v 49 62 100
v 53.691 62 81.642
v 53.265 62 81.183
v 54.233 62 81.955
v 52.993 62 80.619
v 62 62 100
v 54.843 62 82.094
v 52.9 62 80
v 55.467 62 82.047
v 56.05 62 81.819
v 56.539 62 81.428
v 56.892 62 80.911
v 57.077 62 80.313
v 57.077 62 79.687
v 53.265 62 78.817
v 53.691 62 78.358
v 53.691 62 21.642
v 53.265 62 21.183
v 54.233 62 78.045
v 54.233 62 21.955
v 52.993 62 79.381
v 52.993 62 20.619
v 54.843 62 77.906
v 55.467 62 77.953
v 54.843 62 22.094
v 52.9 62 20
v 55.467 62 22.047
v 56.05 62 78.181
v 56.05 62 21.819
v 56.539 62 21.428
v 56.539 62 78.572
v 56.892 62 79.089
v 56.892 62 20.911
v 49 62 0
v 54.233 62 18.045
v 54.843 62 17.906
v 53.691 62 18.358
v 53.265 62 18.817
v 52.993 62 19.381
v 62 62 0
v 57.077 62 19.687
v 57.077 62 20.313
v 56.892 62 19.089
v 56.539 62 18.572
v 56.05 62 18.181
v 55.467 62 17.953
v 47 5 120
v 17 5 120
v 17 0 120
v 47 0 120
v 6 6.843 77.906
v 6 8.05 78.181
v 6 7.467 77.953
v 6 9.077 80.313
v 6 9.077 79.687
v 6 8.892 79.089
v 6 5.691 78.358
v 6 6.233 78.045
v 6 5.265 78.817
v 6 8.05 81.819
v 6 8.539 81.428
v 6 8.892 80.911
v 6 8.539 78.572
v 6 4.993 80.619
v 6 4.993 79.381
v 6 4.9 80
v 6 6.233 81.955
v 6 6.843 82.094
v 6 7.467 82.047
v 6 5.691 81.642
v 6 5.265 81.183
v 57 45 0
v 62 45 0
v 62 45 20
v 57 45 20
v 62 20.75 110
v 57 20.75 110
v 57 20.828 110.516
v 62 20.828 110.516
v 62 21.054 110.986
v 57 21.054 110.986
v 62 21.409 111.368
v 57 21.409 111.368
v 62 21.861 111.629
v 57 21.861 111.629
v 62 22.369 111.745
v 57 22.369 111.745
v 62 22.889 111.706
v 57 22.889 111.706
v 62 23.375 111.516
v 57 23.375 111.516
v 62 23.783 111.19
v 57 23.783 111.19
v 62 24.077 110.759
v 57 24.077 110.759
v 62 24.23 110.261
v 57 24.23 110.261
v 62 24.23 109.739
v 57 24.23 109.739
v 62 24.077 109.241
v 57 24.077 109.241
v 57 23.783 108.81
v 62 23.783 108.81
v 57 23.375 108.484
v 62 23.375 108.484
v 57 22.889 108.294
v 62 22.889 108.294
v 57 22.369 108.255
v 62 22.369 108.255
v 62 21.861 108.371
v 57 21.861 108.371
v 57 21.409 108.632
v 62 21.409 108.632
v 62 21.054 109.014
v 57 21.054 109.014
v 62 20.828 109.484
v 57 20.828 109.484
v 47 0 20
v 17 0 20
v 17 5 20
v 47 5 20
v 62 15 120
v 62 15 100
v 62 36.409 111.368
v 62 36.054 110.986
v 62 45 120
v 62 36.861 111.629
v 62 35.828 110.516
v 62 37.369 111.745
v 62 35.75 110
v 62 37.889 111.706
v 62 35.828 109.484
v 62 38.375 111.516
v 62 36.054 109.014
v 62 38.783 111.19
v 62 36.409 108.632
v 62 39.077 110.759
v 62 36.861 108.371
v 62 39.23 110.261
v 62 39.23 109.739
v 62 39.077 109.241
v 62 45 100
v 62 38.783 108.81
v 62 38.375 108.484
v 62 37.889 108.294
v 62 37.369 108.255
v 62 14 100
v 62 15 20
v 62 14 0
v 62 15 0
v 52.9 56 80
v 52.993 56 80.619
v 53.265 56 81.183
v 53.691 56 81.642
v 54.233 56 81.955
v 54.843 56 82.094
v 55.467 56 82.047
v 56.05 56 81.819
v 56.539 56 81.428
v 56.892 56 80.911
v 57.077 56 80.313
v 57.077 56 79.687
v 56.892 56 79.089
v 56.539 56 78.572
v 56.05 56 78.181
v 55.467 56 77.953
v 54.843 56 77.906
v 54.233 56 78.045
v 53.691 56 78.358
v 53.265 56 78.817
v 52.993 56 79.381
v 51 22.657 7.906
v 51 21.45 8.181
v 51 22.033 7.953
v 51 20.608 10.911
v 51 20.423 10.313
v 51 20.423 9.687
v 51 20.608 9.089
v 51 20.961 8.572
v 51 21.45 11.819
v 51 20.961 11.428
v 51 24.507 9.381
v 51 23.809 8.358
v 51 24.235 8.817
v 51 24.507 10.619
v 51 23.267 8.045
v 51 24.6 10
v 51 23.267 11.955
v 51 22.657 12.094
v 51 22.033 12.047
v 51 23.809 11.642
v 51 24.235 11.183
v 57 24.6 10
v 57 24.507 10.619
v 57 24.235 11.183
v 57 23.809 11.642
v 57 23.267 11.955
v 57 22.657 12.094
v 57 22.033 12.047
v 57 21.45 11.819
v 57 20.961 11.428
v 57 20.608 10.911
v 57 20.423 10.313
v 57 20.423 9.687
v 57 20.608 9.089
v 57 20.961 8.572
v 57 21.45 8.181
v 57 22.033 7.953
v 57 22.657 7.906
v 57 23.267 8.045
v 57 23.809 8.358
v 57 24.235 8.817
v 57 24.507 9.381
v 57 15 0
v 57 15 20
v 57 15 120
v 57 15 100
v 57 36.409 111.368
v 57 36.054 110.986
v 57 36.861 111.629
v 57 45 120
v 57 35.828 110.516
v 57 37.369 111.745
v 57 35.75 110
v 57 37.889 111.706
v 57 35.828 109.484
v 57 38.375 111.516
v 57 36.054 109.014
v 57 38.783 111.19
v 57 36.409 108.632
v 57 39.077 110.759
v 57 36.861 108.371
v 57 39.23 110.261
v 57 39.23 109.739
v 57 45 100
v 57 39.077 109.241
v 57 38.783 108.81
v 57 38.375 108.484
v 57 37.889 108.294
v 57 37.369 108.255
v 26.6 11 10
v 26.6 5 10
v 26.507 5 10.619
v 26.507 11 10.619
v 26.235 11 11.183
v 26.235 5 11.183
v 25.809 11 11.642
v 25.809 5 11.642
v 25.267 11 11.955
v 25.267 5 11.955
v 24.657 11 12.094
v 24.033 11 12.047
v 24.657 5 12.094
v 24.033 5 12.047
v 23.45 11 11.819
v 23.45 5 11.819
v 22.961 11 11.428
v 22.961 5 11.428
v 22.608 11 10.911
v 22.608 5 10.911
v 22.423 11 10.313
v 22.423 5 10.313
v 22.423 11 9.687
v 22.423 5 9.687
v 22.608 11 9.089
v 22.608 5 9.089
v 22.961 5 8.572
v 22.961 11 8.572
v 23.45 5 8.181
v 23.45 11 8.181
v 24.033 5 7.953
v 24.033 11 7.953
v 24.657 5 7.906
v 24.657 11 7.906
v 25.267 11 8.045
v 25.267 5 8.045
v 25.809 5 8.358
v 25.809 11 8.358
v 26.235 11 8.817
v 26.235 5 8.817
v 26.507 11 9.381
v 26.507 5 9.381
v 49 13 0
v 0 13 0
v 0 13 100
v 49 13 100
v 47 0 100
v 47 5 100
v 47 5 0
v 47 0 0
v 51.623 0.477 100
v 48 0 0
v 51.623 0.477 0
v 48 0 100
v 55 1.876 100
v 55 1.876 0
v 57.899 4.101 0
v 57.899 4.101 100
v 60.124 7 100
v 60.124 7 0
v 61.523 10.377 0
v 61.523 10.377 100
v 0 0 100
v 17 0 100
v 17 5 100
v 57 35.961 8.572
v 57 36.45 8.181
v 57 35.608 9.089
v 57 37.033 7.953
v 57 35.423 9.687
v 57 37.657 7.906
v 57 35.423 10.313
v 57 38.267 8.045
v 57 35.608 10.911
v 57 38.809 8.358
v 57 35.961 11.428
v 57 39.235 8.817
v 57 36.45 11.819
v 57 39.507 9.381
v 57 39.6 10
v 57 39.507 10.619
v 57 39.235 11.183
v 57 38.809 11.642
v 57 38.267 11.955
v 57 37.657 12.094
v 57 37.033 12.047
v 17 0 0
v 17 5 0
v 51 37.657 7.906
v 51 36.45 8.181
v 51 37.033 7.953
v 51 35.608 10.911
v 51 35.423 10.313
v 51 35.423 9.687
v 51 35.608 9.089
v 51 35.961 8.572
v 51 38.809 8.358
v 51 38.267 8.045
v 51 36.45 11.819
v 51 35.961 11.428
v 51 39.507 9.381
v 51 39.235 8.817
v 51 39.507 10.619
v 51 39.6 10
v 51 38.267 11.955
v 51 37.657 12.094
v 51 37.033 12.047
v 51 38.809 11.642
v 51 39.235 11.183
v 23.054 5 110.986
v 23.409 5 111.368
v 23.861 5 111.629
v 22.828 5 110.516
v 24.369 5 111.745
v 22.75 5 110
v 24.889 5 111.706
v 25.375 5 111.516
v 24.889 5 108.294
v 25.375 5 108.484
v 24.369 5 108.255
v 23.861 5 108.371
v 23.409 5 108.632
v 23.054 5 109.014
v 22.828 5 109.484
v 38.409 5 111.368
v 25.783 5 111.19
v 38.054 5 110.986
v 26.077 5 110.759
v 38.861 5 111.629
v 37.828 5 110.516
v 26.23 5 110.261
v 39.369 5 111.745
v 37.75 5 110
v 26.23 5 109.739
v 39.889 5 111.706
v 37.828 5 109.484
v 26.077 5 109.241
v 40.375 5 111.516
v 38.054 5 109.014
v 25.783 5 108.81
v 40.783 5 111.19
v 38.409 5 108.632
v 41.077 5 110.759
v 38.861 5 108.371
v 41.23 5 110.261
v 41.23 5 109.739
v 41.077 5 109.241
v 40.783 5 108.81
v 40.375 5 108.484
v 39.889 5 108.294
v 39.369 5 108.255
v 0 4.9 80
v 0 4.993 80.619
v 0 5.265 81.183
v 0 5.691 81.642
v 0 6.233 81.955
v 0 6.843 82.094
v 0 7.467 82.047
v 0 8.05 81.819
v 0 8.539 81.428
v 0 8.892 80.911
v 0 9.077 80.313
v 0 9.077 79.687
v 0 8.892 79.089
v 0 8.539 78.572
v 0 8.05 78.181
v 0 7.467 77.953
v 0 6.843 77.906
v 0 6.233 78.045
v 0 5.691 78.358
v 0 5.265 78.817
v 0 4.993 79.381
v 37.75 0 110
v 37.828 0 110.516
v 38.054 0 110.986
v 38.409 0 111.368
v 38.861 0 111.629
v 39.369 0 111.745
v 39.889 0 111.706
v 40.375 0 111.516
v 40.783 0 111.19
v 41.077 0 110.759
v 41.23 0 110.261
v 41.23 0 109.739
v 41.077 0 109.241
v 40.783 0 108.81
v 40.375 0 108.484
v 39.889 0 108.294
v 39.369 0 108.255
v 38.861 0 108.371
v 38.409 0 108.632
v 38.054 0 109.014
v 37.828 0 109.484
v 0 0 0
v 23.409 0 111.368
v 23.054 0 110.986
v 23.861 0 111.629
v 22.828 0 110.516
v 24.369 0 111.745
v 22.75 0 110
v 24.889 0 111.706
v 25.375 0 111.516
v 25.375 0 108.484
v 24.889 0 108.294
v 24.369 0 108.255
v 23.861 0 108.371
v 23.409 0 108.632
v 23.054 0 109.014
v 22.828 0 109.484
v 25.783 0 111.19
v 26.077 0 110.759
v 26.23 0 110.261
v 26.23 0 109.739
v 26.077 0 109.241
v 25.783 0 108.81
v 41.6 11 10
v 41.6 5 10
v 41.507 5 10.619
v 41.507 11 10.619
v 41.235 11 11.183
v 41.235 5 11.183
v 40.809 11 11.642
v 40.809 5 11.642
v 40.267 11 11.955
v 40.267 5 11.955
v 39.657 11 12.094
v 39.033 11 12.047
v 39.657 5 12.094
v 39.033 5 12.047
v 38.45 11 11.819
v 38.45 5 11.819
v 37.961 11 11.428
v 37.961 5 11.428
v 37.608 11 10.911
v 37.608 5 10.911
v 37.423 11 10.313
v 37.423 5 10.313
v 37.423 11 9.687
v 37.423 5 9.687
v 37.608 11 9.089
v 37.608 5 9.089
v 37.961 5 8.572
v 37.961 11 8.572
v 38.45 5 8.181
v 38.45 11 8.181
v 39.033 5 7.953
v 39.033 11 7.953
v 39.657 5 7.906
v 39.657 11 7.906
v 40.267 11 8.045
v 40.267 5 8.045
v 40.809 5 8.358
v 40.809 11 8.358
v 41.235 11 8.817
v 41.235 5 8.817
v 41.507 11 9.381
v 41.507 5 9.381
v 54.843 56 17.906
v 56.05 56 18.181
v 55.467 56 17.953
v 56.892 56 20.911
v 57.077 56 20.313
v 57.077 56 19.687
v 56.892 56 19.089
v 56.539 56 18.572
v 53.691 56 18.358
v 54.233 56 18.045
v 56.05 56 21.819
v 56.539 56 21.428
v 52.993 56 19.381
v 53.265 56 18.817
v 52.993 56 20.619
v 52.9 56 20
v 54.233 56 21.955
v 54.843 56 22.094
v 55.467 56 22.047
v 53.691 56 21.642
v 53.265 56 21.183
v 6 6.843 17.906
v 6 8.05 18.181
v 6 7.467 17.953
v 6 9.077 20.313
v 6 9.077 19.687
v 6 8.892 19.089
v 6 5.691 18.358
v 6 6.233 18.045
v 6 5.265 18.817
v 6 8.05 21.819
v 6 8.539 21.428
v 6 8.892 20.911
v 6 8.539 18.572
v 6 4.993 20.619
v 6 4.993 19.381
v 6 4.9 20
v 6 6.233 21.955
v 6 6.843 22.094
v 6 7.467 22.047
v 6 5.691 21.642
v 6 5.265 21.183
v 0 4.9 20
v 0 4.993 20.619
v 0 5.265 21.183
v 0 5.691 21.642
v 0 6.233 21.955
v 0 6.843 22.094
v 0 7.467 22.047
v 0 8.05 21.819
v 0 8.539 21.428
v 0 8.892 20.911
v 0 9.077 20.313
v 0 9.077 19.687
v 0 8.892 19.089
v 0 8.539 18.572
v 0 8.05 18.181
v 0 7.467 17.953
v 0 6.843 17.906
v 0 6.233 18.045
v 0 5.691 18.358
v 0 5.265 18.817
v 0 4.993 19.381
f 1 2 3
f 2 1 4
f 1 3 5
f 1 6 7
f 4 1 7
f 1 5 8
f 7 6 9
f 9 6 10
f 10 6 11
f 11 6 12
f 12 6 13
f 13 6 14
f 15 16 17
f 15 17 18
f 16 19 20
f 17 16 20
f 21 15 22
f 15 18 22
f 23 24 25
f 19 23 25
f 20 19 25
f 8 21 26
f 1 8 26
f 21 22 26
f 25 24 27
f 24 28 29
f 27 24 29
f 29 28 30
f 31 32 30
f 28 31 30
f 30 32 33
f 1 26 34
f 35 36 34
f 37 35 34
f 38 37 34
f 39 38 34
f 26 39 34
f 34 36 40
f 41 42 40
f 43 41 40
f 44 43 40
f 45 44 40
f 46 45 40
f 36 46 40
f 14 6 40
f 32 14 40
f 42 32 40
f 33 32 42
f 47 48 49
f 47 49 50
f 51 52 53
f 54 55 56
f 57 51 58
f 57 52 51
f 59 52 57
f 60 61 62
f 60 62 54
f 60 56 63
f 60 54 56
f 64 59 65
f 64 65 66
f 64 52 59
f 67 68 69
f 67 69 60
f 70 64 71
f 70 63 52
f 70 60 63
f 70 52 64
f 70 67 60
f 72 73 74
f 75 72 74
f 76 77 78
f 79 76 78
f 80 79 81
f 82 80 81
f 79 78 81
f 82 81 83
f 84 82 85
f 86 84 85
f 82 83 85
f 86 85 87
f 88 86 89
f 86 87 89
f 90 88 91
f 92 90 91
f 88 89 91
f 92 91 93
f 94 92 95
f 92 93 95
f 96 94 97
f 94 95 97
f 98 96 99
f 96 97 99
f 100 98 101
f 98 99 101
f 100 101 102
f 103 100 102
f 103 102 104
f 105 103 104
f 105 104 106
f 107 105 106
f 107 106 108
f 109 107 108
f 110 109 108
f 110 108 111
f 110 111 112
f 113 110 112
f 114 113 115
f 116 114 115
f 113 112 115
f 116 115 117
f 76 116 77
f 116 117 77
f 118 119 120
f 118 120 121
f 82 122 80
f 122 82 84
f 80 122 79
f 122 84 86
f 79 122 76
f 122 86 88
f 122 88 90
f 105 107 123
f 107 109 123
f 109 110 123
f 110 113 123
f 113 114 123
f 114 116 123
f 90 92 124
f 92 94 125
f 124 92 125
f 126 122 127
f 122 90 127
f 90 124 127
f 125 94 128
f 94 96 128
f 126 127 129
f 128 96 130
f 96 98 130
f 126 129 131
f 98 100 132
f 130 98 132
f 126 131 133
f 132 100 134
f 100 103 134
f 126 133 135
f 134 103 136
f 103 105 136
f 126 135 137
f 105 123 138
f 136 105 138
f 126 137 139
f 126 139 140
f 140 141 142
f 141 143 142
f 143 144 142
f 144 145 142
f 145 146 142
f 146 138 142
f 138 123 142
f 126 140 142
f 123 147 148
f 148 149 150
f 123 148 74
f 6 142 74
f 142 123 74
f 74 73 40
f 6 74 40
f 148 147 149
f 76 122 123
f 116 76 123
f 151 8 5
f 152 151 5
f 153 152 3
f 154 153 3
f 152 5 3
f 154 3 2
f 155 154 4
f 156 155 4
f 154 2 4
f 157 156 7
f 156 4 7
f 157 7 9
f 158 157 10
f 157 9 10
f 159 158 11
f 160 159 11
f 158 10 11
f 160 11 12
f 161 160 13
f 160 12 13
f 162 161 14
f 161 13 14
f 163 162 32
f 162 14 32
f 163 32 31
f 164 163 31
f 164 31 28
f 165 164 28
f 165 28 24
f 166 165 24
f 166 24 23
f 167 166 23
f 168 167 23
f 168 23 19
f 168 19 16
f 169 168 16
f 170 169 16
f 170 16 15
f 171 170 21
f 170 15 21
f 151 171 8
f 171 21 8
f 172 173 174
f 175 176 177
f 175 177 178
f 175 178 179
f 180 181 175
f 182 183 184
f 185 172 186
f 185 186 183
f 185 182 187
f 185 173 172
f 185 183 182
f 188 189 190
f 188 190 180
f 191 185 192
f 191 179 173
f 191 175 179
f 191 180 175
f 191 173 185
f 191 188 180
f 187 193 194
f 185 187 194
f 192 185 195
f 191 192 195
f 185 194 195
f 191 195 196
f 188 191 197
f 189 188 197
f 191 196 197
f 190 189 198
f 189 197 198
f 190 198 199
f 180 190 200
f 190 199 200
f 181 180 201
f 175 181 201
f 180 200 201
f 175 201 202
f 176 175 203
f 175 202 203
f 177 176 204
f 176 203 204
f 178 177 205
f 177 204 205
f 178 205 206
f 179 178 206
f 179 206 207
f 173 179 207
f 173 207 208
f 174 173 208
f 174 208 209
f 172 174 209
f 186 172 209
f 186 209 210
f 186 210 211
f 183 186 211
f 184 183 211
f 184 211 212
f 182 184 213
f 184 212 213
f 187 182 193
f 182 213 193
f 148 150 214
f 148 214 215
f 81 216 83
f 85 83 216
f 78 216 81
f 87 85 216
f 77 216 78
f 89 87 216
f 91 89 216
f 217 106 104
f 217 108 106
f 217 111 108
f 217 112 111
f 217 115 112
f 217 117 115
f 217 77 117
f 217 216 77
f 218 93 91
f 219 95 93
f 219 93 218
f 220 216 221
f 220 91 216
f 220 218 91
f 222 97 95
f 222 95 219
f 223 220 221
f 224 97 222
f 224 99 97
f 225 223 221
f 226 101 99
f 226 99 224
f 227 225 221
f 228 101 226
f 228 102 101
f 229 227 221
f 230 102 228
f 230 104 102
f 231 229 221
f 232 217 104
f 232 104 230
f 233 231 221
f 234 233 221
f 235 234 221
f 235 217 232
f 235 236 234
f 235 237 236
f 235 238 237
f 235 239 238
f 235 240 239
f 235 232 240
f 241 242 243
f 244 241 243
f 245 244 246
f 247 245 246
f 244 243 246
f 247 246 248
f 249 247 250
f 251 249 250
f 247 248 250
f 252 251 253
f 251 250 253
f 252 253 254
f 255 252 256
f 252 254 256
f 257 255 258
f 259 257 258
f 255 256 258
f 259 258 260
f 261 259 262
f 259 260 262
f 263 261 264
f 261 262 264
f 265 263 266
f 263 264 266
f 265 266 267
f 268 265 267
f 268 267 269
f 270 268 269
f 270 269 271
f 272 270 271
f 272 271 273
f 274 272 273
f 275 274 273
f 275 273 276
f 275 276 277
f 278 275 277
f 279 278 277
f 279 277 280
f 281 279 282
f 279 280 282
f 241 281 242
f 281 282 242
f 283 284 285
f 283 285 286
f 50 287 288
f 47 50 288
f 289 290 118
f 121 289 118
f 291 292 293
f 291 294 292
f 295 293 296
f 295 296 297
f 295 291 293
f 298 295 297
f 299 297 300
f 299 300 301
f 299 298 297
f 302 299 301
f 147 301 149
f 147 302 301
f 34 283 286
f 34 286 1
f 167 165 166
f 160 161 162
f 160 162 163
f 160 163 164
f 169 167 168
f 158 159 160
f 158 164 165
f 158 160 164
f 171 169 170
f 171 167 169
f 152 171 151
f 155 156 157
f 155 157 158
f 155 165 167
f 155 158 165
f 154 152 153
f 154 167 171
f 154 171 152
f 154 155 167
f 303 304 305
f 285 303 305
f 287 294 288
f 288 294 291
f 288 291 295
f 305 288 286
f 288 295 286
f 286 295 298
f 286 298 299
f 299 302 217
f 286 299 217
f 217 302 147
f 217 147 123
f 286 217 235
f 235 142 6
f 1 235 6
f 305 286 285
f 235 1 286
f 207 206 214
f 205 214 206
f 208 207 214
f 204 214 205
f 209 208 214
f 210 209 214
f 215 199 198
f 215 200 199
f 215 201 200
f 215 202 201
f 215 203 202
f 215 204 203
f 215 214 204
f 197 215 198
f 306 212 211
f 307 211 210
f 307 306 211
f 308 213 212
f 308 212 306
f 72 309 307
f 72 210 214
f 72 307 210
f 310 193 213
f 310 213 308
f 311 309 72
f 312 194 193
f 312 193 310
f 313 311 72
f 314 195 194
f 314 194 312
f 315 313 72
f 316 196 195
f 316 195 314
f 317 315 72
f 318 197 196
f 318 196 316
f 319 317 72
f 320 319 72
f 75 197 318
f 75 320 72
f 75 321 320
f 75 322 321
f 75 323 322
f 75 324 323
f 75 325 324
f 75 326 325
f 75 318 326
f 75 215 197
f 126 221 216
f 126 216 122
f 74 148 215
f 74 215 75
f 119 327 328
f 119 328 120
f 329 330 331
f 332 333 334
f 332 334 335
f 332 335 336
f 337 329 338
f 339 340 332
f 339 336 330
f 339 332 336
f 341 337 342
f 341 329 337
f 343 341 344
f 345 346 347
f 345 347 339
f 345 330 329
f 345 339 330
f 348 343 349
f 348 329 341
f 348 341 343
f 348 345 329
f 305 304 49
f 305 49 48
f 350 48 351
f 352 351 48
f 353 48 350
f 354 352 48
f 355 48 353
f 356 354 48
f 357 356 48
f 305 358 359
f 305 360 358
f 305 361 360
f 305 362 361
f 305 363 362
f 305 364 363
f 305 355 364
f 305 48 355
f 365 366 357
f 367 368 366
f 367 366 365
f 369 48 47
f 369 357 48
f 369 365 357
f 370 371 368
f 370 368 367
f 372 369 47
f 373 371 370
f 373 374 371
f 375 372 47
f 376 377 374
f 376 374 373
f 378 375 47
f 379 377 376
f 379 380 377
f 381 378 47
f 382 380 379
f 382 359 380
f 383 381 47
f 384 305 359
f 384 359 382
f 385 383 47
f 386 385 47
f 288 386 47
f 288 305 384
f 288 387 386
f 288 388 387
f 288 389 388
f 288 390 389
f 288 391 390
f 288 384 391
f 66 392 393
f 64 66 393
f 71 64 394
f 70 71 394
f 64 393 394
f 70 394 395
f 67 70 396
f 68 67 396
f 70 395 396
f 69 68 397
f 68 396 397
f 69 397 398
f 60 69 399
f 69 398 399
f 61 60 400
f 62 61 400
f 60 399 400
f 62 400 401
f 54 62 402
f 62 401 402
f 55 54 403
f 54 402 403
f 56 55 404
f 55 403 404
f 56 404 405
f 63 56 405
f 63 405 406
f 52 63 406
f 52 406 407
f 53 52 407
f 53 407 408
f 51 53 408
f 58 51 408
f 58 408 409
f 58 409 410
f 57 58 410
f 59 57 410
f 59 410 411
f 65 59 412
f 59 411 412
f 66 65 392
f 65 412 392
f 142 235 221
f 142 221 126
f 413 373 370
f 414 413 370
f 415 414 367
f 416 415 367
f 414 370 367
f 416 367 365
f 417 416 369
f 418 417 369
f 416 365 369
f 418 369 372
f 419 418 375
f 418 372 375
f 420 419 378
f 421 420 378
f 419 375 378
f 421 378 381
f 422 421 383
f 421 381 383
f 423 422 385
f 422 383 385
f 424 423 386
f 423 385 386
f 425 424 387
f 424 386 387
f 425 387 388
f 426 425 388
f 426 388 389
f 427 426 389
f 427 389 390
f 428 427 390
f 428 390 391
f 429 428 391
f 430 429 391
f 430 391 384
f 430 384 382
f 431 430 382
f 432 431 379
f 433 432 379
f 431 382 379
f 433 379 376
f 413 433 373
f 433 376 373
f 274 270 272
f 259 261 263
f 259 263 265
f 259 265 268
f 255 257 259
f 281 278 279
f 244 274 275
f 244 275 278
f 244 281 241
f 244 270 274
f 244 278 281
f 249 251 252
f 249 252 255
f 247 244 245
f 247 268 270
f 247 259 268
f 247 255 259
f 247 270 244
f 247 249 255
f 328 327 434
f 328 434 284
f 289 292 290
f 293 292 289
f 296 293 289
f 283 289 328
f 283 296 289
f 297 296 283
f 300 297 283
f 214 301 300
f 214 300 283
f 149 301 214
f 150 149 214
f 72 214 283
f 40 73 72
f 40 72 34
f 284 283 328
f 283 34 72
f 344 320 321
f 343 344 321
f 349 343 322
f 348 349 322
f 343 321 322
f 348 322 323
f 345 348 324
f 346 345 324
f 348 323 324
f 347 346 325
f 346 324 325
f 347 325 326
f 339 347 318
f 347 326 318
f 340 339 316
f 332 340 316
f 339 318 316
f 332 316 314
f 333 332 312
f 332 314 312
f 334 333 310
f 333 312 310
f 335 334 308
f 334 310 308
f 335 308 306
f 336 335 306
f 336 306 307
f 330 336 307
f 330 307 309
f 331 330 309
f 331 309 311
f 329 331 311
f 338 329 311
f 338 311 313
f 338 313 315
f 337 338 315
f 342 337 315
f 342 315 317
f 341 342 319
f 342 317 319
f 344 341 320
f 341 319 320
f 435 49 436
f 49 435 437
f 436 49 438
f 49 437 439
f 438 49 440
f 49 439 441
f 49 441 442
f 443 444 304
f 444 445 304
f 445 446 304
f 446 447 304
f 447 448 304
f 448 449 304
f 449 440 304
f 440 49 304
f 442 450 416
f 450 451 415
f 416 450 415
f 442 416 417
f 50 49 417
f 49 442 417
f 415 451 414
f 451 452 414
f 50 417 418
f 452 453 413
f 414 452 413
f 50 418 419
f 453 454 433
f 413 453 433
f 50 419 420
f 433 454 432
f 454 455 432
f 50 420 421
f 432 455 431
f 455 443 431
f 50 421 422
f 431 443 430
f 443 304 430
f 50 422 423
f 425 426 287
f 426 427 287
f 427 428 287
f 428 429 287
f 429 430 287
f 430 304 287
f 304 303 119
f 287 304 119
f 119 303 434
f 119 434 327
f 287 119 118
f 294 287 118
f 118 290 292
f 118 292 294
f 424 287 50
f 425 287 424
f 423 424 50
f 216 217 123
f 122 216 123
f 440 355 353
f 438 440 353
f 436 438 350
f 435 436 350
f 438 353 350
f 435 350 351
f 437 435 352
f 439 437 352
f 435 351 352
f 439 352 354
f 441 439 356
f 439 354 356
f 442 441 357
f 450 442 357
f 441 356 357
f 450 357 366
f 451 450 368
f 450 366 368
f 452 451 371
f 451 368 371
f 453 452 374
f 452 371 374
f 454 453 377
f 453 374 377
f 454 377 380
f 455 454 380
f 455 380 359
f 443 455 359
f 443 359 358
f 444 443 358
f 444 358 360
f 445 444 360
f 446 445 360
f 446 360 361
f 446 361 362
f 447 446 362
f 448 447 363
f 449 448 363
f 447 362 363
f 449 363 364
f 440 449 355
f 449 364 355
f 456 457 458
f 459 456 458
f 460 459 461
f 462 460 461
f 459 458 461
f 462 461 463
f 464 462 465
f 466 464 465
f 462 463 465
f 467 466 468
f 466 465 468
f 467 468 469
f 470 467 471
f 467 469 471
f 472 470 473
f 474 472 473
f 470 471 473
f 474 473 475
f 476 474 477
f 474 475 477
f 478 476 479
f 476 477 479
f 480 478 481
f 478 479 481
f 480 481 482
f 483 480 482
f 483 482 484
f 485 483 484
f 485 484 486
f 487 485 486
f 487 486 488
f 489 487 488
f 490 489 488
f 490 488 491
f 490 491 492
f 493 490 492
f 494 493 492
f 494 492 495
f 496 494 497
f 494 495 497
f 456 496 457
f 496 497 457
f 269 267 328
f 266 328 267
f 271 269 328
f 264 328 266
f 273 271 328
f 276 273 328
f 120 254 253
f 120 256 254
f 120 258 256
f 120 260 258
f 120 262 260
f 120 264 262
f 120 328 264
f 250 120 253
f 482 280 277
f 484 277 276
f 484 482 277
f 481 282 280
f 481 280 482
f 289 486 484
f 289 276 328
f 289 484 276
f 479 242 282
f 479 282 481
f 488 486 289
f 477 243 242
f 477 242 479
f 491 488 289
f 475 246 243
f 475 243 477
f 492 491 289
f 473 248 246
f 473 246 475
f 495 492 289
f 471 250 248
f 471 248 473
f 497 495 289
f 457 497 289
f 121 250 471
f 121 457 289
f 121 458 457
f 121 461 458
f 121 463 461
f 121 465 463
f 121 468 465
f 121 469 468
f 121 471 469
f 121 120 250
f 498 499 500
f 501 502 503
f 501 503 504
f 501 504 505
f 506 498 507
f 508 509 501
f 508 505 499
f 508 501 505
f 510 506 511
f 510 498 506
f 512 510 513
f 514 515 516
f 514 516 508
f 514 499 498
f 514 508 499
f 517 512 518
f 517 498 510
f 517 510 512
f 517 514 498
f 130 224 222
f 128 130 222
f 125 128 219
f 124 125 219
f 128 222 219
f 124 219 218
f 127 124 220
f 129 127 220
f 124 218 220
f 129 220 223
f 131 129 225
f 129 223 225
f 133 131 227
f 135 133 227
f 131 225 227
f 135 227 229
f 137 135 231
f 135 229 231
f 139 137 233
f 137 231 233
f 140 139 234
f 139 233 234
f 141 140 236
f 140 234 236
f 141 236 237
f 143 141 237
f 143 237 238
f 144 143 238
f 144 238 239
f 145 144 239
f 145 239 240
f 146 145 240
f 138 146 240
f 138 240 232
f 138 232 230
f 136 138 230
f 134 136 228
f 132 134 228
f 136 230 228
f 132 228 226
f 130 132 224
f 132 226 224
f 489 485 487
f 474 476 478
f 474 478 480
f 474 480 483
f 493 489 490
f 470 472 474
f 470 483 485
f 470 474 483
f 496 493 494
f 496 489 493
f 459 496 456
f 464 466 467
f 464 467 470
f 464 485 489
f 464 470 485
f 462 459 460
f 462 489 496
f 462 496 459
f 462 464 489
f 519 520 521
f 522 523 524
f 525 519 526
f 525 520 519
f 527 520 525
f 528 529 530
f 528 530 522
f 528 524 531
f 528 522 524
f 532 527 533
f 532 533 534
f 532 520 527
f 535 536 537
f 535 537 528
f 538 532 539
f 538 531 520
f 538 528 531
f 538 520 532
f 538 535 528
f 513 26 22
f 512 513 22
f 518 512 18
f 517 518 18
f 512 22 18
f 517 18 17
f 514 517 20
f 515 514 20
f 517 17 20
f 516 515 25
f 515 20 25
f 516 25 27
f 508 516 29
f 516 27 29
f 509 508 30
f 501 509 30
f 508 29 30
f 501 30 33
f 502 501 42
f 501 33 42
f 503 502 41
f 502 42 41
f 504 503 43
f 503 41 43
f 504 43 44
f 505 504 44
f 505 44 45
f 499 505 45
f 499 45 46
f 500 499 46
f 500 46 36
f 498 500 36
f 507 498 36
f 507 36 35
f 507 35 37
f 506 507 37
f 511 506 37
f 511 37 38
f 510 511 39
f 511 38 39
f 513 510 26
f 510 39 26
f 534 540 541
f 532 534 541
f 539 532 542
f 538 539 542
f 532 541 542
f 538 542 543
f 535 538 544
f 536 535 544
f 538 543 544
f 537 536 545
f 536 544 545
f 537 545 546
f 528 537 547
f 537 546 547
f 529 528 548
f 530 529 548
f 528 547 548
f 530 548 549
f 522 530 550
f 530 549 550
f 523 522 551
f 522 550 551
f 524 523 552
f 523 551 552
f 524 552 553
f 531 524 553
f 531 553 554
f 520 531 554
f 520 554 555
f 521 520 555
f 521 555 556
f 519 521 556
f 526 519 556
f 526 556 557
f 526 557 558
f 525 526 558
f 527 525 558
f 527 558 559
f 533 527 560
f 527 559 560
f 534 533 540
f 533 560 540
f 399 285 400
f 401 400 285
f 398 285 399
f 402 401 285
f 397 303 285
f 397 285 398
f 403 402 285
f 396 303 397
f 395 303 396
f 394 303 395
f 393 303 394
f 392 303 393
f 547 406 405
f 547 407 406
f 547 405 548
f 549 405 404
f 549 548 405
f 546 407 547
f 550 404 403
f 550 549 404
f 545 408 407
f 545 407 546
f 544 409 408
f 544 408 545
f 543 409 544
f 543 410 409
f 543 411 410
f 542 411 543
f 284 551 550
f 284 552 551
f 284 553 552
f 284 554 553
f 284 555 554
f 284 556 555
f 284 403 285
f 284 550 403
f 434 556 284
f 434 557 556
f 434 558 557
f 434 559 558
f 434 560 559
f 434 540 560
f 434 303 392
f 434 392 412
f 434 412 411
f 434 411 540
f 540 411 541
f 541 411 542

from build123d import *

# Parameters (mm, degrees)
SKETCH_W          = 62
SKETCH_H          = 62
PAD_DEPTH         = 100
SKETCH001_W       = 30
SKETCH001_H       = 5
SKETCH001_W_2     = 5
SKETCH001_H_2     = 30
PAD001_DEPTH      = 20
FILLET_R          = 14
SKETCH002_W       = 52
SKETCH002_H       = 52
POCKET_DEPTH      = 103
SKETCH003_R       = 1.75
POCKET001_DEPTH   = 5
SKETCH004_R       = 1.75
POCKET002_DEPTH   = 5
POCKET002_FACE8_W = 52
POCKET002_FACE8_H = 100
PAD002_DEPTH      = 2
PAD002_FACE8_W    = 50
PAD002_FACE8_H    = 100
PAD003_DEPTH      = 2
PAD003_FACE25_W   = 50
PAD003_FACE25_H   = 100
PAD004_DEPTH      = 1
PAD004_FACE24_W   = 49
PAD004_FACE24_H   = 100
PAD005_DEPTH      = 1
SKETCH005_R       = 2.1
POCKET003_DEPTH   = 6
SKETCH006_R       = 2.1
POCKET004_DEPTH   = 6
SKETCH007_W       = 30
SKETCH007_H       = 20
POCKET005_DEPTH   = 5
SKETCH008_W       = 30
SKETCH008_H       = 20
POCKET006_DEPTH   = 5
SKETCH009_R       = 2.1
POCKET007_DEPTH   = 6
SKETCH010_R       = 2.1
POCKET008_DEPTH   = 6


with BuildPart() as part:
    # Sketch → Pad (new body)
    with BuildSketch(Plane.XY):
        with Locations((31, 31)):
            Rectangle(SKETCH_W, SKETCH_H)
    extrude(amount=PAD_DEPTH)

    # Sketch001 (on Face6 of Pad) → Pad001 (join)
    with BuildSketch(Plane.XY.offset(100)):
        with Locations((32, 2.5)):
            Rectangle(SKETCH001_W, SKETCH001_H)
        with Locations((59.5, 30)):
            Rectangle(SKETCH001_W_2, SKETCH001_H_2)
    extrude(amount=PAD001_DEPTH)

    # Fillet
    fillet_edges = [part.edges().sort_by_distance(p)[0] for p in [
        (62, 0, 50),
    ]]
    fillet(fillet_edges, radius=FILLET_R)

    # Sketch002 (on Face5 of Fillet) → Pocket (cut)
    with BuildSketch(Plane.XY.offset(100)):
        with Locations((26, 36)):
            Rectangle(SKETCH002_W, SKETCH002_H)
    extrude(amount=-POCKET_DEPTH, mode=Mode.SUBTRACT)

    # Sketch003 (on Face15 of Pocket) → Pocket001 (cut)
    with BuildSketch(Plane(origin=(57, 0, 0), x_dir=(0, -1, 0), z_dir=(-1, 0, 0))):
        with Locations((-37.5, 110)):
            Circle(SKETCH003_R)
        with Locations((-22.5, 110)):
            Circle(SKETCH003_R)
    extrude(amount=-POCKET001_DEPTH, mode=Mode.SUBTRACT)

    # Sketch004 (on Face12 of Pocket001) → Pocket002 (cut)
    with BuildSketch(Plane(origin=(0, 5, 0), x_dir=(-1, 0, 0), z_dir=(0, 1, 0))):
        with Locations((-39.5, 110)):
            Circle(SKETCH004_R)
        with Locations((-24.5, 110)):
            Circle(SKETCH004_R)
    extrude(amount=-POCKET002_DEPTH, mode=Mode.SUBTRACT)

    # Pocket002 Face8 → Pad002 (add)
    with BuildSketch(Plane(origin=(52, 36, 50), x_dir=(0, 1, 0), z_dir=(-1, 0, 0))):
        Rectangle(POCKET002_FACE8_W, POCKET002_FACE8_H)
    extrude(amount=PAD002_DEPTH)

    # Pad002 Face8 → Pad003 (add)
    with BuildSketch(Plane(origin=(25, 10, 50), x_dir=(1, 0, 0), z_dir=(0, 1, 0))):
        Rectangle(PAD002_FACE8_W, PAD002_FACE8_H)
    extrude(amount=PAD003_DEPTH)

    # Pad003 Face25 → Pad004 (add)
    with BuildSketch(Plane(origin=(25, 12, 50), x_dir=(1, 0, 0), z_dir=(0, 1, 0))):
        Rectangle(PAD003_FACE25_W, PAD003_FACE25_H)
    extrude(amount=PAD004_DEPTH)

    # Pad004 Face24 → Pad005 (add)
    with BuildSketch(Plane(origin=(50, 37.5, 50), x_dir=(0, 1, 0), z_dir=(-1, 0, 0))):
        Rectangle(PAD004_FACE24_W, PAD004_FACE24_H)
    extrude(amount=PAD005_DEPTH)

    # Sketch005 (on Face4 of Pad005) → Pocket003 (cut)
    with BuildSketch(Plane(origin=(0, 0, 0), x_dir=(0, -1, 0), z_dir=(-1, 0, 0))):
        with Locations((-7, 80)):
            Circle(SKETCH005_R)
        with Locations((-7, 20)):
            Circle(SKETCH005_R)
    extrude(amount=-POCKET003_DEPTH, mode=Mode.SUBTRACT)

    # Sketch006 (on Face9 of Pocket003) → Pocket004 (cut)
    with BuildSketch(Plane(origin=(0, 62, 0), x_dir=(-1, 0, 0), z_dir=(0, 1, 0))):
        with Locations((-55, 80)):
            Circle(SKETCH006_R)
        with Locations((-55, 20)):
            Circle(SKETCH006_R)
    extrude(amount=-POCKET004_DEPTH, mode=Mode.SUBTRACT)

    # Sketch007 (on Face10 of Pocket004) → Pocket005 (cut)
    with BuildSketch(Plane.YZ.offset(62)):
        with Locations((30, 10)):
            Rectangle(SKETCH007_W, SKETCH007_H)
    extrude(amount=-POCKET005_DEPTH, mode=Mode.SUBTRACT)

    # Sketch008 (on Face1 of Pocket005) → Pocket006 (cut)
    with BuildSketch(Plane.XZ):
        with Locations((32, 10)):
            Rectangle(SKETCH008_W, SKETCH008_H)
    extrude(amount=-POCKET006_DEPTH, mode=Mode.SUBTRACT)

    # Sketch009 (on Face15 of Pocket006) → Pocket007 (cut)
    with BuildSketch(Plane.YZ.offset(57)):
        with Locations((37.5, 10)):
            Circle(SKETCH009_R)
        with Locations((22.5, 10)):
            Circle(SKETCH009_R)
    extrude(amount=-POCKET007_DEPTH, mode=Mode.SUBTRACT)

    # Sketch010 (on Face17 of Pocket007) → Pocket008 (cut)
    with BuildSketch(Plane.XZ.offset(-5)):
        with Locations((39.5, 10)):
            Circle(SKETCH010_R)
        with Locations((24.5, 10)):
            Circle(SKETCH010_R)
    extrude(amount=-POCKET008_DEPTH, mode=Mode.SUBTRACT)


solid = part.part
